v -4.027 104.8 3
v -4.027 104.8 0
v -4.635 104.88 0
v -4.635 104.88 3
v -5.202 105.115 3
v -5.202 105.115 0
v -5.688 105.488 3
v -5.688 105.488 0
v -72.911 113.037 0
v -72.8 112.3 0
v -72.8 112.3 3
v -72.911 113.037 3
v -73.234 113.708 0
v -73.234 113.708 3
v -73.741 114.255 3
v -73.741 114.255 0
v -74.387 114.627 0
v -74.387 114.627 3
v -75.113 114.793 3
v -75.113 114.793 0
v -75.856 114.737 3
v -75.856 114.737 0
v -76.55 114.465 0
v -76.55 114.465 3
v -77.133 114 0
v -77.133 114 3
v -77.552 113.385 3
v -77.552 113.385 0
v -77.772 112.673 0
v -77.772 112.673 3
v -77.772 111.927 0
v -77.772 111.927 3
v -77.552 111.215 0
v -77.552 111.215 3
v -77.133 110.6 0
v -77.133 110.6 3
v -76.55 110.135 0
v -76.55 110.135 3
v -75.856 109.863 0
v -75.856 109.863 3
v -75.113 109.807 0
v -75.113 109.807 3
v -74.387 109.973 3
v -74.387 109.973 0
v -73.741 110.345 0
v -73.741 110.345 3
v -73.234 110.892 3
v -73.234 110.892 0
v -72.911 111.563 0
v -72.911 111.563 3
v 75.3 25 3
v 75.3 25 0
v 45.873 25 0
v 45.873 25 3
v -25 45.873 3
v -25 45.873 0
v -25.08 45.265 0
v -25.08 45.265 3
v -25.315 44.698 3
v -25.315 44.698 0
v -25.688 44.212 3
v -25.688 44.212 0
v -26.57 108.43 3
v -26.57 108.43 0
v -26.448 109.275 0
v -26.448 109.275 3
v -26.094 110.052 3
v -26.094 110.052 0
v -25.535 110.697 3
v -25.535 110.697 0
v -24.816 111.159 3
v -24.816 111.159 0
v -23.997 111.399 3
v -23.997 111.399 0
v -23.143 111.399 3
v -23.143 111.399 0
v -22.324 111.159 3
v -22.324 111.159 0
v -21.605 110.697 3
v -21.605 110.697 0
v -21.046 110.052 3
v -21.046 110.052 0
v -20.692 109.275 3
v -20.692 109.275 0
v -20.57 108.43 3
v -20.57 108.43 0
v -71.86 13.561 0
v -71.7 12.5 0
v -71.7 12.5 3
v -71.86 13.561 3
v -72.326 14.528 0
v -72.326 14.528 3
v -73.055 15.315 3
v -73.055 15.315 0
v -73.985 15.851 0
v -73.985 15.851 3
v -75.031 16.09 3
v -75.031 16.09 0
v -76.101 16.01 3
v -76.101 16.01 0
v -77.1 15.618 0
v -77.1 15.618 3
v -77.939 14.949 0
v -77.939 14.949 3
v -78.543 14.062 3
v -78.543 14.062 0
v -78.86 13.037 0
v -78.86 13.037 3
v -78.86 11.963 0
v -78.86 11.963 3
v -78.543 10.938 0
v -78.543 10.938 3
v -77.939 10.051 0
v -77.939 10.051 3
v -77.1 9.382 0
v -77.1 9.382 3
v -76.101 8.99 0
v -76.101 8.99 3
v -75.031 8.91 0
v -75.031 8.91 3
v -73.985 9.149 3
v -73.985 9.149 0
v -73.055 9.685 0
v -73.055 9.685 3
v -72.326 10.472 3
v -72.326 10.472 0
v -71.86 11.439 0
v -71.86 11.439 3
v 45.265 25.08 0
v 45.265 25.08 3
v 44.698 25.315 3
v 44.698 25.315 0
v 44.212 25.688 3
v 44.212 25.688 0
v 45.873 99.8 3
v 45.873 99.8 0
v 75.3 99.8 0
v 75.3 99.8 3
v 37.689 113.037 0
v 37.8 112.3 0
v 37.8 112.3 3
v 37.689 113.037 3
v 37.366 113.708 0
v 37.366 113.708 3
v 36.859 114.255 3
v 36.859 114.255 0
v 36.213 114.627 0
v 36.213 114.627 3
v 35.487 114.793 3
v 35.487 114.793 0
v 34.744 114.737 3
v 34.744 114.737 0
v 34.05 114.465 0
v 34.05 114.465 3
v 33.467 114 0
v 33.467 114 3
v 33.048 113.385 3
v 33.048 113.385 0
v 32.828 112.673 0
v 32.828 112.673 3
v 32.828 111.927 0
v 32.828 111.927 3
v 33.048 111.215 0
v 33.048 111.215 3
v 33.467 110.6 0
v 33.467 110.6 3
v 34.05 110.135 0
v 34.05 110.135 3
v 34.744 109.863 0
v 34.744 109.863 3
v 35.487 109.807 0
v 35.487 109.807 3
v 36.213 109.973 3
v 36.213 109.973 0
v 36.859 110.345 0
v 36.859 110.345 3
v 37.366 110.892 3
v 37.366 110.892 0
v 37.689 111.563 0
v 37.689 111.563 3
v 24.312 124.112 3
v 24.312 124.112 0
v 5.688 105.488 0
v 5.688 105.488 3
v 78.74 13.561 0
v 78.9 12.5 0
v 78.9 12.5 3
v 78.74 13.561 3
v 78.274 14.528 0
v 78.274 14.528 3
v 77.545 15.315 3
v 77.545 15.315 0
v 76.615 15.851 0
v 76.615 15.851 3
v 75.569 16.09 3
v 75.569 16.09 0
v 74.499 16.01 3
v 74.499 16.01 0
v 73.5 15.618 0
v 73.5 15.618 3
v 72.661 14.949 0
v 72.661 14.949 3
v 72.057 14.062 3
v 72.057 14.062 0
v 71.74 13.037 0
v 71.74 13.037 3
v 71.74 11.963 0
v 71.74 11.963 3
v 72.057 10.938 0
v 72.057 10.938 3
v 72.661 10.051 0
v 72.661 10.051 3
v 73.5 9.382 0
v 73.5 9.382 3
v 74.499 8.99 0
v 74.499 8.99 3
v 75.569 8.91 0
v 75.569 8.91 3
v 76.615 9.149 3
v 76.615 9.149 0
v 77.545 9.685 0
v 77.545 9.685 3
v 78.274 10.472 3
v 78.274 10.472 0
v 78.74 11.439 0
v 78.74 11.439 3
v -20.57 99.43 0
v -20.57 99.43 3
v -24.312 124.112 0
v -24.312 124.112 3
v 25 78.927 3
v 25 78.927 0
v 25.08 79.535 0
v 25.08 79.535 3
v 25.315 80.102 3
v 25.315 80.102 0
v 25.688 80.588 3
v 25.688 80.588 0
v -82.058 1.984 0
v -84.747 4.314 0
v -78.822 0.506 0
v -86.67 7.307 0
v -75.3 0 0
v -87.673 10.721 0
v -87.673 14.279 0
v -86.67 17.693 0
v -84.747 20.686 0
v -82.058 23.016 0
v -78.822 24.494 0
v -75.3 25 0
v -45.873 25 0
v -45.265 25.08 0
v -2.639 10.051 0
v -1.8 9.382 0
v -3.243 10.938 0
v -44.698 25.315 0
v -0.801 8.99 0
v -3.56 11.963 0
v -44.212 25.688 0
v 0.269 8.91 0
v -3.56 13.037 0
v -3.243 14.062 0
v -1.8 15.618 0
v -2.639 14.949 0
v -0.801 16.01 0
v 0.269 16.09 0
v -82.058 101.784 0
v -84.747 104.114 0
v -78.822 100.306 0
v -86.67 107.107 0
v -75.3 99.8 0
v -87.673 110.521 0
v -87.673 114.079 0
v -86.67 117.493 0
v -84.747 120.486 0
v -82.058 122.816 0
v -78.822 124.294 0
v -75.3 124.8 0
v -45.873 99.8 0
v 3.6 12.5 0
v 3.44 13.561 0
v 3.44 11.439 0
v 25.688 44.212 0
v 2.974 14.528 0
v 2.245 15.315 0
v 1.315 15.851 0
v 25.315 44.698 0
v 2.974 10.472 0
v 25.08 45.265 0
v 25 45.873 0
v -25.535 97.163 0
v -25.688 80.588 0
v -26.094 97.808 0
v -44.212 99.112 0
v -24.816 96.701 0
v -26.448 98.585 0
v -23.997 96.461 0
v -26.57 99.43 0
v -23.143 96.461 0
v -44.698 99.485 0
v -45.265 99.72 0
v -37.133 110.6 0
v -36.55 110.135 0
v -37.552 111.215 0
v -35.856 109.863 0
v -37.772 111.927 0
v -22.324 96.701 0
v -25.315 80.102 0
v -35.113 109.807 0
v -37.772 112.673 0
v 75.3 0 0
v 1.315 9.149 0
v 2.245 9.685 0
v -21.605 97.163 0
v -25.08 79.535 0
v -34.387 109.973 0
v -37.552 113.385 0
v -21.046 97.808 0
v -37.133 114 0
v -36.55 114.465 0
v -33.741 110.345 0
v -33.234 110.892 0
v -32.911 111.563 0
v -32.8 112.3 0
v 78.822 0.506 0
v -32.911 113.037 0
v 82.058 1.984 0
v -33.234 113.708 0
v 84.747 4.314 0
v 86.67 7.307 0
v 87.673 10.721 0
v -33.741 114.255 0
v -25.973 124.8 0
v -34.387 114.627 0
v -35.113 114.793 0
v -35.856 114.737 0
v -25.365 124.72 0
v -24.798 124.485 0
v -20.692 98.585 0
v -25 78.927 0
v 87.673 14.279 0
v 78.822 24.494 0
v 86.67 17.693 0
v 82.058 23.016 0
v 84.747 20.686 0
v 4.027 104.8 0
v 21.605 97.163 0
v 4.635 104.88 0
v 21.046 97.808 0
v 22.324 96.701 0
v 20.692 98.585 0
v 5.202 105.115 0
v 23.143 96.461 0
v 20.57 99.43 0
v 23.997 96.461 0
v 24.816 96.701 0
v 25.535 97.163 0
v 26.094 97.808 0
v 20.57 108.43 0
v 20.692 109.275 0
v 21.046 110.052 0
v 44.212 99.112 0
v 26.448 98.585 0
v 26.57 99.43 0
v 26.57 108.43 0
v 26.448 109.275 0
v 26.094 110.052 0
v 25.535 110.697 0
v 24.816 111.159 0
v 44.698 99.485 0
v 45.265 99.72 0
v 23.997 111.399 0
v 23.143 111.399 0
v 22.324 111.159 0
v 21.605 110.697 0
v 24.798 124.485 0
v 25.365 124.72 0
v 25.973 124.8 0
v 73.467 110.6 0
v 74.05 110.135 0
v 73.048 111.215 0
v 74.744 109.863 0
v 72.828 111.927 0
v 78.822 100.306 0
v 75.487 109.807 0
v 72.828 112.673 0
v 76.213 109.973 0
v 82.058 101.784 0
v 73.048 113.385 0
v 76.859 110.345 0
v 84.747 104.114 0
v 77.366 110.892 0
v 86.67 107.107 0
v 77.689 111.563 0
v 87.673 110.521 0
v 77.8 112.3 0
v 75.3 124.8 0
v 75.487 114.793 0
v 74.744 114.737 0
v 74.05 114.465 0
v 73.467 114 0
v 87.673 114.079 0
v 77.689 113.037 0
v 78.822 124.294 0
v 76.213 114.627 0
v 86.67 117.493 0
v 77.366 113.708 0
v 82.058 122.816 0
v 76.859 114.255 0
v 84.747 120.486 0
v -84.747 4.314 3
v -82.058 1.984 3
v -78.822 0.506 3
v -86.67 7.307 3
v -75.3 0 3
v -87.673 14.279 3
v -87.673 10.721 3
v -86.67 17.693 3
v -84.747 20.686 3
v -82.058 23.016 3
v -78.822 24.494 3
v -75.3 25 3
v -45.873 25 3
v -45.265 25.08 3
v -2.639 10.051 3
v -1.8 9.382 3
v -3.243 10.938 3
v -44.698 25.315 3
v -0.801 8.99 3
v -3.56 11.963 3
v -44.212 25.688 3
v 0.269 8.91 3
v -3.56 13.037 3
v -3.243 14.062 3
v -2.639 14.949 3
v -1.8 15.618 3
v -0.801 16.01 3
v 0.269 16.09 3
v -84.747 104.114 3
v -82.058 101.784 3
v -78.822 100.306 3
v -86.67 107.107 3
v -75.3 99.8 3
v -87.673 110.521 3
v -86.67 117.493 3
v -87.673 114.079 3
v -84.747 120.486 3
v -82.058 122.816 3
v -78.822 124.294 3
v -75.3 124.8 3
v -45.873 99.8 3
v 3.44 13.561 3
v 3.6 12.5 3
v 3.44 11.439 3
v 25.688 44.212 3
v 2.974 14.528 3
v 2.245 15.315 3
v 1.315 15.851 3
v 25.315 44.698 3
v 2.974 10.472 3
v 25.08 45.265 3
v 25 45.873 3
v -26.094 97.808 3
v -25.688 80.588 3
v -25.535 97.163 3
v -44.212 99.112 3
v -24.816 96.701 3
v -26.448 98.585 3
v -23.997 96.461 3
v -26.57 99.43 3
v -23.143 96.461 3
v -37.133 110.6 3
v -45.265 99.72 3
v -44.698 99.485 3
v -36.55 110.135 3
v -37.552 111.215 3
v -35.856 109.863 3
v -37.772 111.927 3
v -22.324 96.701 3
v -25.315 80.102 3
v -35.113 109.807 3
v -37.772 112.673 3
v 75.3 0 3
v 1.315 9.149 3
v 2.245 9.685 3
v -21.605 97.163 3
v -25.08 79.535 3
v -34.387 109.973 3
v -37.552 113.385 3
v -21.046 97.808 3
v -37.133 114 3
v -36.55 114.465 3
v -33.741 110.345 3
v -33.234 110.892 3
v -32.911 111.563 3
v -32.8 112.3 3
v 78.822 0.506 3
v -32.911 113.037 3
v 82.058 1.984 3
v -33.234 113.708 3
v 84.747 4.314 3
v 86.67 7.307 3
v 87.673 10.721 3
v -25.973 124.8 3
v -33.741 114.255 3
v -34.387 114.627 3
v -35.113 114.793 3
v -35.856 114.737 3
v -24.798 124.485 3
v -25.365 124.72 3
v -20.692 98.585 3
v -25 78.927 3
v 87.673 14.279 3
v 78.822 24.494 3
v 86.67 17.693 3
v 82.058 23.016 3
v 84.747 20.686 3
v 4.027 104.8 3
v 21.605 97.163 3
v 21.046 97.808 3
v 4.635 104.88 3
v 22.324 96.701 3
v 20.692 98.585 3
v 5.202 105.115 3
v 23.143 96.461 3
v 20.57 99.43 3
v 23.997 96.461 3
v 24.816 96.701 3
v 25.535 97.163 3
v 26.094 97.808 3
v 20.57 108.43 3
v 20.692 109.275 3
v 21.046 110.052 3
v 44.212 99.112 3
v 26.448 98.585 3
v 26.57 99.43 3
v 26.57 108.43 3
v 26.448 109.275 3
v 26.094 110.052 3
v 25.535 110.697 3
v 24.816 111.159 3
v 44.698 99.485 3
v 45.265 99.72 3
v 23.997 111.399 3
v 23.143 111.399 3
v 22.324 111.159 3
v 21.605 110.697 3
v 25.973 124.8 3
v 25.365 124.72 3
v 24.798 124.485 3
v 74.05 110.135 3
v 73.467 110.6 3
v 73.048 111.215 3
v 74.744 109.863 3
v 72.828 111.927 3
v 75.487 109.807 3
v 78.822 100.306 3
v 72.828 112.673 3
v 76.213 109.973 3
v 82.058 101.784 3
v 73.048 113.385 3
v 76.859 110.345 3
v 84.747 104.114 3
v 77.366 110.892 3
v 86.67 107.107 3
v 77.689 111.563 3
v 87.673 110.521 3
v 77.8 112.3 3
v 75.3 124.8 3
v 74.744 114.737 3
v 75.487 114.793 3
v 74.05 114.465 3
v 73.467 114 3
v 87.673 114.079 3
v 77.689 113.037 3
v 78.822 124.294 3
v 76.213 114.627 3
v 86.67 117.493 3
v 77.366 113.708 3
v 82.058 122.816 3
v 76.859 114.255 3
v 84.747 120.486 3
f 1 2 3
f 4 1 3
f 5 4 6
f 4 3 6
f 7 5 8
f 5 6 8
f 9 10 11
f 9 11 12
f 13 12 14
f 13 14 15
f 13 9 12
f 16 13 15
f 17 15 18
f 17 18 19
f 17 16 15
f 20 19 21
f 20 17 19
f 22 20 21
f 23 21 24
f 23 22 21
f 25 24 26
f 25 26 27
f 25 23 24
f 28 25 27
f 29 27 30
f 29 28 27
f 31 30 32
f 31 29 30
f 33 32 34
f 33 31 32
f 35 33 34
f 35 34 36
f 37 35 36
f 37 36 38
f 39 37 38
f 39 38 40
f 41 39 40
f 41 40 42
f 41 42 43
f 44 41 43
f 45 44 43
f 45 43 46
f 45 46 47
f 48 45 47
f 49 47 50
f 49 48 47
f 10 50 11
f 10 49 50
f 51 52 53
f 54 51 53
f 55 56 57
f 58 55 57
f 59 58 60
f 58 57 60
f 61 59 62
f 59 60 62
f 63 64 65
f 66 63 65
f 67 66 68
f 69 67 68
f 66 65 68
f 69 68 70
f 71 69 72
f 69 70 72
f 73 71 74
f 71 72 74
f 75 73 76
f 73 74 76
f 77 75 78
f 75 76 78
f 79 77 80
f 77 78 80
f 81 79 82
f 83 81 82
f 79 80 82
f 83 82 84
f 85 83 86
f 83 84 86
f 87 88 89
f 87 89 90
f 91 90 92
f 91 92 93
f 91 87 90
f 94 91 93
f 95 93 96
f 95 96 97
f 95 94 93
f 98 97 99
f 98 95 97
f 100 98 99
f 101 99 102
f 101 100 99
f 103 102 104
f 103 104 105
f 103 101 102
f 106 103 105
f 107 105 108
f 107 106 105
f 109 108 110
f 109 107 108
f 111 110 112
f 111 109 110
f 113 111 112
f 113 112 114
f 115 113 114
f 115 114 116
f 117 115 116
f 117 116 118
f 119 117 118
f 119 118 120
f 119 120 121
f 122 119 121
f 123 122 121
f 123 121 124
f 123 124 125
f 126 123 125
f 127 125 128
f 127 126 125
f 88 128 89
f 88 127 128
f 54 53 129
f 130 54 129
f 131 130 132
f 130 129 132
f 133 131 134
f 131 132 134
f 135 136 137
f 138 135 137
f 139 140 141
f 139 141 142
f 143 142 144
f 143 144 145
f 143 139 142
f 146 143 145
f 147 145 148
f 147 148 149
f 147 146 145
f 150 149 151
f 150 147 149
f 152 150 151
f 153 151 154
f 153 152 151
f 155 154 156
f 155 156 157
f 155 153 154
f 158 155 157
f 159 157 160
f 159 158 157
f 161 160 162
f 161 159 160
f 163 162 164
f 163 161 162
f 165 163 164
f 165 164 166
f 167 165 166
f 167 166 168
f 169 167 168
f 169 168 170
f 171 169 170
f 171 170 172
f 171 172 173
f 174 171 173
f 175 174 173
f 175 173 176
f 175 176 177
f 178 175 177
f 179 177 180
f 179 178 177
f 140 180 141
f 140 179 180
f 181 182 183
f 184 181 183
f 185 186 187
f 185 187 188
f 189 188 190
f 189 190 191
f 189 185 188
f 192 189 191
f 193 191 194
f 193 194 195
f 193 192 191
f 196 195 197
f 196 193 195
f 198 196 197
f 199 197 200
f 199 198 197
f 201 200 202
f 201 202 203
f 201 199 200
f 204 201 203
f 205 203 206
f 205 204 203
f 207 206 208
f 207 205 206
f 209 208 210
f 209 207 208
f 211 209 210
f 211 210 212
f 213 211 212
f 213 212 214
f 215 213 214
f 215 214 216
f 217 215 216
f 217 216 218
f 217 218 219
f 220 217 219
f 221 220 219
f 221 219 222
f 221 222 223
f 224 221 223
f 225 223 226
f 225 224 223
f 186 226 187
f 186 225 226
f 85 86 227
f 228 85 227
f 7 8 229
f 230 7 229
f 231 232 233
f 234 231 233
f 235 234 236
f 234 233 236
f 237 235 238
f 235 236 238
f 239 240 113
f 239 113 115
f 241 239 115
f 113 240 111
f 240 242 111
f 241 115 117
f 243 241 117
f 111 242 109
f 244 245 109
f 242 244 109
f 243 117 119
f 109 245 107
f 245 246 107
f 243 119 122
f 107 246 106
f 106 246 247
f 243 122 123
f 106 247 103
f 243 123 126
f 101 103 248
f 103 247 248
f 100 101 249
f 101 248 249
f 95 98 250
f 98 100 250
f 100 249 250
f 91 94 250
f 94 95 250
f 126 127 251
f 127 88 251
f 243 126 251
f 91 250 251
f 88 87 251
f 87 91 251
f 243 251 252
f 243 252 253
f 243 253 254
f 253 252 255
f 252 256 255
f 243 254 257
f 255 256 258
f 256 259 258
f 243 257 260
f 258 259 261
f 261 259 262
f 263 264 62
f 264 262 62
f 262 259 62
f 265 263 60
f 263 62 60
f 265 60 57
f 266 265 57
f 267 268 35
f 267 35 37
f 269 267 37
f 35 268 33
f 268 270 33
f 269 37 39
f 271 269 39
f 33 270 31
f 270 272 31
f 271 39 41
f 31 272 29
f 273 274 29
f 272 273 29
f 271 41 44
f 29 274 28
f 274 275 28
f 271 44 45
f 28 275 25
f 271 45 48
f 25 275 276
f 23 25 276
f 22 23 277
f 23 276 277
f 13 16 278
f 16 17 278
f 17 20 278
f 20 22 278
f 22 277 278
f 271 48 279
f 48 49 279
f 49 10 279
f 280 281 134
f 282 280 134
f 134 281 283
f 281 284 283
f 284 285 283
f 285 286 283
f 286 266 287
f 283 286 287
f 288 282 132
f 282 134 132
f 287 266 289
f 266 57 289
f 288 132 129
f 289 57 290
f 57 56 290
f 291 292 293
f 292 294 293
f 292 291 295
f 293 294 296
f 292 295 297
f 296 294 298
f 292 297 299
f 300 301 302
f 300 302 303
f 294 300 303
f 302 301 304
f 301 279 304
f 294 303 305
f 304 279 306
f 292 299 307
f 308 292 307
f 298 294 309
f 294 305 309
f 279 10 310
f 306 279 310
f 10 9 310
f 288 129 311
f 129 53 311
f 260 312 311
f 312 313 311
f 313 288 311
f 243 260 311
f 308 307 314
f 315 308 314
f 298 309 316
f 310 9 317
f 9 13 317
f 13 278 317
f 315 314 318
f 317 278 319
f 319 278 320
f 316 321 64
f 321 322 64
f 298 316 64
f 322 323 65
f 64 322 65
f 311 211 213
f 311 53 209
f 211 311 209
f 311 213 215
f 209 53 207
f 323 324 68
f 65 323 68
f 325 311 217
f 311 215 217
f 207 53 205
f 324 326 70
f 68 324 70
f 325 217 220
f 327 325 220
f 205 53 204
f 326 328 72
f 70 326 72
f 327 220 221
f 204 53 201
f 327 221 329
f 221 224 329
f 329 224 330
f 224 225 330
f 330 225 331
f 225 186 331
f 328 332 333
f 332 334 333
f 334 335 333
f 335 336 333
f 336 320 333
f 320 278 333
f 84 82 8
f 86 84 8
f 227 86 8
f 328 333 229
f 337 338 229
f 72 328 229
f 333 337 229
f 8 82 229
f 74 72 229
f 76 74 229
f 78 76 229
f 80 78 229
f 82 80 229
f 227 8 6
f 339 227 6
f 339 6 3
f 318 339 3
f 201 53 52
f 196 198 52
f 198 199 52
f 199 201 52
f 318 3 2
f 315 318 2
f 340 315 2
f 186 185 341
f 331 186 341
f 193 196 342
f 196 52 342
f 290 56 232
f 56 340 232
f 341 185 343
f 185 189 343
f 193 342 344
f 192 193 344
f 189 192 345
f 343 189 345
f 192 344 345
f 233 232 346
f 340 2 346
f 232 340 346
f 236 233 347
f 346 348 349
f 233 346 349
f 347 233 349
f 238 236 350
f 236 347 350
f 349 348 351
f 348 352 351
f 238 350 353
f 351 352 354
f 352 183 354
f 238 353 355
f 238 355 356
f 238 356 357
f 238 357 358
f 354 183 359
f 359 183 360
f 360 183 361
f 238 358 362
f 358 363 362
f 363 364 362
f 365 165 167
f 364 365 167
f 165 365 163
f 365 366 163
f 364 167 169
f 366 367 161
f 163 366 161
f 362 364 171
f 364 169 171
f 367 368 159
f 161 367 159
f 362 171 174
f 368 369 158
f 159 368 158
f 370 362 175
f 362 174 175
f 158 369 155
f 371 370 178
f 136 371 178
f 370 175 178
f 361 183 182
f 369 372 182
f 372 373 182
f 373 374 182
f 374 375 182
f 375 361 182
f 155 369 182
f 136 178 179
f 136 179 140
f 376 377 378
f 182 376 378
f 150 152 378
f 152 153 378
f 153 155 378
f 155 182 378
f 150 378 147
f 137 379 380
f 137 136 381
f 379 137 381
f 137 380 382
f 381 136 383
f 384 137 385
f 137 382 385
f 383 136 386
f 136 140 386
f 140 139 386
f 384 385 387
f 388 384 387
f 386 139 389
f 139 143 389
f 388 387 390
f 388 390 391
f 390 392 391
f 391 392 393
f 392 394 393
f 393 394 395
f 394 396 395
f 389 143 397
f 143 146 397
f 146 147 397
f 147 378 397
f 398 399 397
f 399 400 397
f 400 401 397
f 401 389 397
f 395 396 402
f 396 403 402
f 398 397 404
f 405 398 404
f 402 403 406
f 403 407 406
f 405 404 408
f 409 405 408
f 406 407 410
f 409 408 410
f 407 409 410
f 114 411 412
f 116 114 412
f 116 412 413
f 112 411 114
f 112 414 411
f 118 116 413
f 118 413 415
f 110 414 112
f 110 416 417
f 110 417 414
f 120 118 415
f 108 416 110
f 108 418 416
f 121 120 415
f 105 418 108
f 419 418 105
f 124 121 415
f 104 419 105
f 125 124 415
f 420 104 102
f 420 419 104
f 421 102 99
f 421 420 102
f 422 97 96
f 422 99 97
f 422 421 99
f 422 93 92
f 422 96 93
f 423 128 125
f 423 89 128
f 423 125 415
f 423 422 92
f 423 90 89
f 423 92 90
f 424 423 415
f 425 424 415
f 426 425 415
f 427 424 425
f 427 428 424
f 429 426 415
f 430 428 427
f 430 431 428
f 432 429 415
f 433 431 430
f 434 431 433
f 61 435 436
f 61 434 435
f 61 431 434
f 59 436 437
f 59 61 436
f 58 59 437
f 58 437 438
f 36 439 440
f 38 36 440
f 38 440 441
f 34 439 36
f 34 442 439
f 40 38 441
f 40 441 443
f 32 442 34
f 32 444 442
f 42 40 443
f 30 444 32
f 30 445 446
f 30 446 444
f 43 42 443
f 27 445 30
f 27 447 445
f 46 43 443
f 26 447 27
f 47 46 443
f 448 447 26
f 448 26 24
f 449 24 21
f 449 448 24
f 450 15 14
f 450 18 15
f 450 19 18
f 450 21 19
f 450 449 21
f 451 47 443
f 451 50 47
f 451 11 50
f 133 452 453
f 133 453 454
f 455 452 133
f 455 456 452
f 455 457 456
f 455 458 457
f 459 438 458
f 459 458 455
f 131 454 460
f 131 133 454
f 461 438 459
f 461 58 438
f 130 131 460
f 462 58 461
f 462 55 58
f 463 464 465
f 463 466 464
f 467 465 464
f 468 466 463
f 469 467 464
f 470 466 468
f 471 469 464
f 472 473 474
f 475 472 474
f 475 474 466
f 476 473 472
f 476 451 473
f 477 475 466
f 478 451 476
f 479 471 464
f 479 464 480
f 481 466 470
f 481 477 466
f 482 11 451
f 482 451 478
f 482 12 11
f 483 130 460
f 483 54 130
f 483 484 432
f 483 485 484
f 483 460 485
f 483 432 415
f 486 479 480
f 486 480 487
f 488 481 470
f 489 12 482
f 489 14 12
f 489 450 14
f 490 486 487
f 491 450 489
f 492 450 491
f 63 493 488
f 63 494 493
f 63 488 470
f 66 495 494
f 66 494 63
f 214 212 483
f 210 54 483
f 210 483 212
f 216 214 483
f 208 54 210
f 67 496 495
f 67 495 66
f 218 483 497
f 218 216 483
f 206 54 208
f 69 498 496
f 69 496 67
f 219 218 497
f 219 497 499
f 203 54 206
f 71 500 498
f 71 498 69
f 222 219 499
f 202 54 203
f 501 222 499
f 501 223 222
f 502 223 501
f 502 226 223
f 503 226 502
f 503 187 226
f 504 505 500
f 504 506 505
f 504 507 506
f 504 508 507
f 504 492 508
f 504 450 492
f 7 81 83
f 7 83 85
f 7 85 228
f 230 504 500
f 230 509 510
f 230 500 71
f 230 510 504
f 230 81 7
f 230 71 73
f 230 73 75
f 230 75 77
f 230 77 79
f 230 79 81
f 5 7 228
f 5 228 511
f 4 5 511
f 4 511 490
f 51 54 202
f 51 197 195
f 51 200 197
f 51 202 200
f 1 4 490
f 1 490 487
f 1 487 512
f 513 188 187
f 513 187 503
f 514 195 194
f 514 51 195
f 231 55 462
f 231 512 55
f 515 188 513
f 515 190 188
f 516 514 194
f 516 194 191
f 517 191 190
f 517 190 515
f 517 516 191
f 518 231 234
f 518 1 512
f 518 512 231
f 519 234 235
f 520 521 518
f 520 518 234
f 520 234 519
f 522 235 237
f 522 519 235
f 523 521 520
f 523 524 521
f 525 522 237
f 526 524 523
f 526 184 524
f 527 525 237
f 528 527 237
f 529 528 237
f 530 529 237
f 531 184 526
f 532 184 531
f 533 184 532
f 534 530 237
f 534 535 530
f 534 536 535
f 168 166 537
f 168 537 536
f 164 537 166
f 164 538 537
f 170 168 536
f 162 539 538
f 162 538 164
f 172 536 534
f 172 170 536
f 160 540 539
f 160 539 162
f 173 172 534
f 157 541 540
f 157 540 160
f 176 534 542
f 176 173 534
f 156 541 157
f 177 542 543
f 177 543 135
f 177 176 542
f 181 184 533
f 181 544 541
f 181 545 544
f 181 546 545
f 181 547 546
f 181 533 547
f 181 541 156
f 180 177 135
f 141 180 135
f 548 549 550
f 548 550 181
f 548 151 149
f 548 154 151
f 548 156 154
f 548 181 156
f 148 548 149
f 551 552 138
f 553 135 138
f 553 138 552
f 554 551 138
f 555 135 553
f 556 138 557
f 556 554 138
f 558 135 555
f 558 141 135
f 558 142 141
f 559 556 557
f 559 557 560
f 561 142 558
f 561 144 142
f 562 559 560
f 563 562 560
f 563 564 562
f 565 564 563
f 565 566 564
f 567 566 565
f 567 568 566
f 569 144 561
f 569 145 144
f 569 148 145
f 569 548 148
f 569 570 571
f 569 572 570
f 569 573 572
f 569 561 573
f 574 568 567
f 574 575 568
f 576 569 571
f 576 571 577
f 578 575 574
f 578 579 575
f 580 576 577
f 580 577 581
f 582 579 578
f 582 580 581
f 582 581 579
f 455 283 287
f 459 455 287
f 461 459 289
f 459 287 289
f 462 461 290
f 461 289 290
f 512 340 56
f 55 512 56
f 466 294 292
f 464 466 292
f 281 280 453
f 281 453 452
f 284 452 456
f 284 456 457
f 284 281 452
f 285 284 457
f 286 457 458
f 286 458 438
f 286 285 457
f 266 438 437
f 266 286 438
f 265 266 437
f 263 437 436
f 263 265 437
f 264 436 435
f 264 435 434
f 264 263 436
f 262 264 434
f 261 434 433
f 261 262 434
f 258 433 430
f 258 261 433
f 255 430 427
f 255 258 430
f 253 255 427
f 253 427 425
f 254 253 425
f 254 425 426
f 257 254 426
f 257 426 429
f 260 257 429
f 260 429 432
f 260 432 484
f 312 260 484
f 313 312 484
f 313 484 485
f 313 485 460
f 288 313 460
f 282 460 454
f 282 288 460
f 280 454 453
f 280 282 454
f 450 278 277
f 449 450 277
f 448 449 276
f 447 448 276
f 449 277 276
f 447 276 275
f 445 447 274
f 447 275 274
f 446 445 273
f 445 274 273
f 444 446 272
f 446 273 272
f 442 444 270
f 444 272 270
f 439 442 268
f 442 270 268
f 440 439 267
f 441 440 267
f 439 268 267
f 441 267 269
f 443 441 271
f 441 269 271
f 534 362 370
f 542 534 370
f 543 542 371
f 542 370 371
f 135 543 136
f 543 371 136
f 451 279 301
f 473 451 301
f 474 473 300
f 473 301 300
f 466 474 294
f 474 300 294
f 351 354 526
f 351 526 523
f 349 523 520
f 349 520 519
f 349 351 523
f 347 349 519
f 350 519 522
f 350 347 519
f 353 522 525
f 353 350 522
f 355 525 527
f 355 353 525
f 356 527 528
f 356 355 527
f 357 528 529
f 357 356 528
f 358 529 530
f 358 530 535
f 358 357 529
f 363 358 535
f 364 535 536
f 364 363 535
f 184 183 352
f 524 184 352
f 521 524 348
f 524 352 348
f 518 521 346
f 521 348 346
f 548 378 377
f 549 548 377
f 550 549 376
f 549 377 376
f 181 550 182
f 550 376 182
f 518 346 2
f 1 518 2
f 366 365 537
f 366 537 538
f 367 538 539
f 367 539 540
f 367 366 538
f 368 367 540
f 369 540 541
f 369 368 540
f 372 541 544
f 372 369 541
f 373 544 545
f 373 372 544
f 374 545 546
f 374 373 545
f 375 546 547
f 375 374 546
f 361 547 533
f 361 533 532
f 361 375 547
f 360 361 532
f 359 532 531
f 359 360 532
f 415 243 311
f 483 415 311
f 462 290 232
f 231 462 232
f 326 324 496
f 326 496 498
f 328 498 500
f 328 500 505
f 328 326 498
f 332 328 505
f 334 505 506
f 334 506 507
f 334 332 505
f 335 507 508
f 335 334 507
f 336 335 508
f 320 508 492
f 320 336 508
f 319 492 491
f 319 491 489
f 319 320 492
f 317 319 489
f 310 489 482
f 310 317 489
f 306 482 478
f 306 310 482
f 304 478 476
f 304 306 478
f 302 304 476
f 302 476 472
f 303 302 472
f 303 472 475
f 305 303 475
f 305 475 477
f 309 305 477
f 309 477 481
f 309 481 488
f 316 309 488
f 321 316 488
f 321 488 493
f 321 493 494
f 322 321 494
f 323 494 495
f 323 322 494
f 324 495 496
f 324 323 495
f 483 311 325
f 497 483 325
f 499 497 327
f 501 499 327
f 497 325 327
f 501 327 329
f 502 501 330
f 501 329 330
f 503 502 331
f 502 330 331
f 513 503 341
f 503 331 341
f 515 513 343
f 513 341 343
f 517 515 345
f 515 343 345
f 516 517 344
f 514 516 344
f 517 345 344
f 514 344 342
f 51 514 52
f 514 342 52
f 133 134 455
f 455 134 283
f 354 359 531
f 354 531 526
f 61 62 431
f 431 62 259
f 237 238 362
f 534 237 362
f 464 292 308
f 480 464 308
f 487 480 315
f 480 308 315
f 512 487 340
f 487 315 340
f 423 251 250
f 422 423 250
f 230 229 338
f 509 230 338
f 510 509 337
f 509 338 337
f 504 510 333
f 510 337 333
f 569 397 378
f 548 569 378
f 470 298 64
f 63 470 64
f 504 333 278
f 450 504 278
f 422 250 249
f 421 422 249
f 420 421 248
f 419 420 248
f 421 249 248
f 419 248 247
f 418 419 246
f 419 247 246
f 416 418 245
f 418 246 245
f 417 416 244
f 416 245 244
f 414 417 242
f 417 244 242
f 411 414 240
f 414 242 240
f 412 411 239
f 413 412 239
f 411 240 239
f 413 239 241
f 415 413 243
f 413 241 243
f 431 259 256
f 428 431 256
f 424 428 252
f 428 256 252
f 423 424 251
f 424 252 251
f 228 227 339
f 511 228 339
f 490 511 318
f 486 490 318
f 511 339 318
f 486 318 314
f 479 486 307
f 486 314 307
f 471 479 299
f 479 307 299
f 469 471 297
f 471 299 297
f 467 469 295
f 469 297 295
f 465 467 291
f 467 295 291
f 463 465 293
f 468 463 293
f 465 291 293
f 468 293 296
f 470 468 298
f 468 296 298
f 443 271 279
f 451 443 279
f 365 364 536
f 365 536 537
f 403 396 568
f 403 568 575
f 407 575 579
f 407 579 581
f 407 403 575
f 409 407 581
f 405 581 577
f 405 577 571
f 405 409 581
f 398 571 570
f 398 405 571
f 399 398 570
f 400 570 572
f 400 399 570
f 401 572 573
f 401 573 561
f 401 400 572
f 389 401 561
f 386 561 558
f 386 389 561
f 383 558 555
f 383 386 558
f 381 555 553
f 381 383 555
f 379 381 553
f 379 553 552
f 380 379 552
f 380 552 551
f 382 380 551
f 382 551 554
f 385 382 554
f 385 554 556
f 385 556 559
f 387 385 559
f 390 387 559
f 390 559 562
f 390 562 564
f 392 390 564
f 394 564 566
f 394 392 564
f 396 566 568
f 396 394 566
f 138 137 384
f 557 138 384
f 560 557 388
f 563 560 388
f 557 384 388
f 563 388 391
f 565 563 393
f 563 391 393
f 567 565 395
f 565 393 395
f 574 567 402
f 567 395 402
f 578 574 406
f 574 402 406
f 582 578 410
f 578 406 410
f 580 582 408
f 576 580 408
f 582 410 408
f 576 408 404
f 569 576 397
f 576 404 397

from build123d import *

# Parameters (mm, degrees)
MODEL_R             = 3.6
MODEL_R_2           = 2.5
BOSS_EXTRUDE1_DEPTH = 3


with BuildPart() as part:
    # Model → Boss-Extrude1 (new body)
    with BuildSketch(Plane.XY):
        with BuildLine():
            Line((-75.3, 0), (75.3, 0))
            ThreePointArc((75.3, 0), (87.8, 12.5), (75.3, 25))
            Line((75.3, 25), (45.873401872, 25))
            ThreePointArc((45.873401872, 25), (44.974095806, 25.178883099), (44.211700936, 25.688299064))
            Line((44.211700936, 25.688299064), (25.688299064, 44.211700936))
            ThreePointArc((25.688299064, 44.211700936), (25.178883099, 44.974095805), (25, 45.873401872))
            Line((25, 45.873401872), (25, 78.926598129))
            ThreePointArc((25, 78.926598129), (25.178883099, 79.825904195), (25.688299064, 80.588299064))
            Line((25.688299064, 80.588299064), (44.211700936, 99.111700936))
            ThreePointArc((44.211700936, 99.111700936), (44.974095806, 99.621116901), (45.873401872, 99.8))
            Line((45.873401872, 99.8), (75.3, 99.8))
            ThreePointArc((75.3, 99.8), (87.8, 112.3), (75.3, 124.8))
            Line((75.3, 124.8), (25.973401872, 124.8))
            ThreePointArc((25.973401872, 124.8), (25.074095806, 124.621116901), (24.311700936, 124.111700936))
            Line((24.311700936, 124.111700936), (5.688299064, 105.488299064))
            ThreePointArc((5.688299064, 105.488299064), (4.925904195, 104.978883099), (4.026598129, 104.8))
            Line((4.026598129, 104.8), (-4.026598129, 104.8))
            ThreePointArc((-4.026598129, 104.8), (-4.925904195, 104.978883099), (-5.688299064, 105.488299064))
            Line((-5.688299064, 105.488299064), (-24.311700936, 124.111700936))
            ThreePointArc((-24.311700936, 124.111700936), (-25.074095806, 124.621116901), (-25.973401872, 124.8))
            Line((-25.973401872, 124.8), (-75.3, 124.8))
            ThreePointArc((-75.3, 124.8), (-87.8, 112.3), (-75.3, 99.8))
            Line((-75.3, 99.8), (-45.873401872, 99.8))
            ThreePointArc((-45.873401872, 99.8), (-44.974095806, 99.621116901), (-44.211700936, 99.111700936))
            Line((-44.211700936, 99.111700936), (-25.688299064, 80.588299064))
            ThreePointArc((-25.688299064, 80.588299064), (-25.178883099, 79.825904195), (-25, 78.926598129))
            Line((-25, 78.926598129), (-25, 45.873401872))
            ThreePointArc((-25, 45.873401872), (-25.178883099, 44.974095805), (-25.688299064, 44.211700936))
            Line((-25.688299064, 44.211700936), (-44.211700936, 25.688299064))
            ThreePointArc((-44.211700936, 25.688299064), (-44.974095806, 25.178883099), (-45.873401872, 25))
            Line((-45.873401872, 25), (-75.3, 25))
            ThreePointArc((-75.3, 25), (-87.8, 12.5), (-75.3, 0))
        make_face()
        with Locations((75.3, 12.5)):
            Circle(MODEL_R, mode=Mode.SUBTRACT)
        with Locations((0, 12.5)):
            Circle(MODEL_R, mode=Mode.SUBTRACT)
        with Locations((-75.3, 12.5)):
            Circle(MODEL_R, mode=Mode.SUBTRACT)
        with Locations((-35.3, 112.3)):
            Circle(MODEL_R_2, mode=Mode.SUBTRACT)
        with Locations((-75.3, 112.3)):
            Circle(MODEL_R_2, mode=Mode.SUBTRACT)
        with Locations((35.3, 112.3)):
            Circle(MODEL_R_2, mode=Mode.SUBTRACT)
        with Locations((75.3, 112.3)):
            Circle(MODEL_R_2, mode=Mode.SUBTRACT)
        with BuildLine():
            Line((26.57, 99.43), (26.57, 108.43))
            ThreePointArc((26.57, 108.43), (23.57, 111.43), (20.57, 108.43))
            Line((20.57, 108.43), (20.57, 99.43))
            ThreePointArc((20.57, 99.43), (23.57, 96.43), (26.57, 99.43))
        make_face(mode=Mode.SUBTRACT)
        with BuildLine():
            Line((-26.57, 99.43), (-26.57, 108.43))
            ThreePointArc((-26.57, 108.43), (-23.57, 111.43), (-20.57, 108.43))
            Line((-20.57, 108.43), (-20.57, 99.43))
            ThreePointArc((-20.57, 99.43), (-23.57, 96.43), (-26.57, 99.43))
        make_face(mode=Mode.SUBTRACT)
    extrude(amount=BOSS_EXTRUDE1_DEPTH)


solid = part.part
